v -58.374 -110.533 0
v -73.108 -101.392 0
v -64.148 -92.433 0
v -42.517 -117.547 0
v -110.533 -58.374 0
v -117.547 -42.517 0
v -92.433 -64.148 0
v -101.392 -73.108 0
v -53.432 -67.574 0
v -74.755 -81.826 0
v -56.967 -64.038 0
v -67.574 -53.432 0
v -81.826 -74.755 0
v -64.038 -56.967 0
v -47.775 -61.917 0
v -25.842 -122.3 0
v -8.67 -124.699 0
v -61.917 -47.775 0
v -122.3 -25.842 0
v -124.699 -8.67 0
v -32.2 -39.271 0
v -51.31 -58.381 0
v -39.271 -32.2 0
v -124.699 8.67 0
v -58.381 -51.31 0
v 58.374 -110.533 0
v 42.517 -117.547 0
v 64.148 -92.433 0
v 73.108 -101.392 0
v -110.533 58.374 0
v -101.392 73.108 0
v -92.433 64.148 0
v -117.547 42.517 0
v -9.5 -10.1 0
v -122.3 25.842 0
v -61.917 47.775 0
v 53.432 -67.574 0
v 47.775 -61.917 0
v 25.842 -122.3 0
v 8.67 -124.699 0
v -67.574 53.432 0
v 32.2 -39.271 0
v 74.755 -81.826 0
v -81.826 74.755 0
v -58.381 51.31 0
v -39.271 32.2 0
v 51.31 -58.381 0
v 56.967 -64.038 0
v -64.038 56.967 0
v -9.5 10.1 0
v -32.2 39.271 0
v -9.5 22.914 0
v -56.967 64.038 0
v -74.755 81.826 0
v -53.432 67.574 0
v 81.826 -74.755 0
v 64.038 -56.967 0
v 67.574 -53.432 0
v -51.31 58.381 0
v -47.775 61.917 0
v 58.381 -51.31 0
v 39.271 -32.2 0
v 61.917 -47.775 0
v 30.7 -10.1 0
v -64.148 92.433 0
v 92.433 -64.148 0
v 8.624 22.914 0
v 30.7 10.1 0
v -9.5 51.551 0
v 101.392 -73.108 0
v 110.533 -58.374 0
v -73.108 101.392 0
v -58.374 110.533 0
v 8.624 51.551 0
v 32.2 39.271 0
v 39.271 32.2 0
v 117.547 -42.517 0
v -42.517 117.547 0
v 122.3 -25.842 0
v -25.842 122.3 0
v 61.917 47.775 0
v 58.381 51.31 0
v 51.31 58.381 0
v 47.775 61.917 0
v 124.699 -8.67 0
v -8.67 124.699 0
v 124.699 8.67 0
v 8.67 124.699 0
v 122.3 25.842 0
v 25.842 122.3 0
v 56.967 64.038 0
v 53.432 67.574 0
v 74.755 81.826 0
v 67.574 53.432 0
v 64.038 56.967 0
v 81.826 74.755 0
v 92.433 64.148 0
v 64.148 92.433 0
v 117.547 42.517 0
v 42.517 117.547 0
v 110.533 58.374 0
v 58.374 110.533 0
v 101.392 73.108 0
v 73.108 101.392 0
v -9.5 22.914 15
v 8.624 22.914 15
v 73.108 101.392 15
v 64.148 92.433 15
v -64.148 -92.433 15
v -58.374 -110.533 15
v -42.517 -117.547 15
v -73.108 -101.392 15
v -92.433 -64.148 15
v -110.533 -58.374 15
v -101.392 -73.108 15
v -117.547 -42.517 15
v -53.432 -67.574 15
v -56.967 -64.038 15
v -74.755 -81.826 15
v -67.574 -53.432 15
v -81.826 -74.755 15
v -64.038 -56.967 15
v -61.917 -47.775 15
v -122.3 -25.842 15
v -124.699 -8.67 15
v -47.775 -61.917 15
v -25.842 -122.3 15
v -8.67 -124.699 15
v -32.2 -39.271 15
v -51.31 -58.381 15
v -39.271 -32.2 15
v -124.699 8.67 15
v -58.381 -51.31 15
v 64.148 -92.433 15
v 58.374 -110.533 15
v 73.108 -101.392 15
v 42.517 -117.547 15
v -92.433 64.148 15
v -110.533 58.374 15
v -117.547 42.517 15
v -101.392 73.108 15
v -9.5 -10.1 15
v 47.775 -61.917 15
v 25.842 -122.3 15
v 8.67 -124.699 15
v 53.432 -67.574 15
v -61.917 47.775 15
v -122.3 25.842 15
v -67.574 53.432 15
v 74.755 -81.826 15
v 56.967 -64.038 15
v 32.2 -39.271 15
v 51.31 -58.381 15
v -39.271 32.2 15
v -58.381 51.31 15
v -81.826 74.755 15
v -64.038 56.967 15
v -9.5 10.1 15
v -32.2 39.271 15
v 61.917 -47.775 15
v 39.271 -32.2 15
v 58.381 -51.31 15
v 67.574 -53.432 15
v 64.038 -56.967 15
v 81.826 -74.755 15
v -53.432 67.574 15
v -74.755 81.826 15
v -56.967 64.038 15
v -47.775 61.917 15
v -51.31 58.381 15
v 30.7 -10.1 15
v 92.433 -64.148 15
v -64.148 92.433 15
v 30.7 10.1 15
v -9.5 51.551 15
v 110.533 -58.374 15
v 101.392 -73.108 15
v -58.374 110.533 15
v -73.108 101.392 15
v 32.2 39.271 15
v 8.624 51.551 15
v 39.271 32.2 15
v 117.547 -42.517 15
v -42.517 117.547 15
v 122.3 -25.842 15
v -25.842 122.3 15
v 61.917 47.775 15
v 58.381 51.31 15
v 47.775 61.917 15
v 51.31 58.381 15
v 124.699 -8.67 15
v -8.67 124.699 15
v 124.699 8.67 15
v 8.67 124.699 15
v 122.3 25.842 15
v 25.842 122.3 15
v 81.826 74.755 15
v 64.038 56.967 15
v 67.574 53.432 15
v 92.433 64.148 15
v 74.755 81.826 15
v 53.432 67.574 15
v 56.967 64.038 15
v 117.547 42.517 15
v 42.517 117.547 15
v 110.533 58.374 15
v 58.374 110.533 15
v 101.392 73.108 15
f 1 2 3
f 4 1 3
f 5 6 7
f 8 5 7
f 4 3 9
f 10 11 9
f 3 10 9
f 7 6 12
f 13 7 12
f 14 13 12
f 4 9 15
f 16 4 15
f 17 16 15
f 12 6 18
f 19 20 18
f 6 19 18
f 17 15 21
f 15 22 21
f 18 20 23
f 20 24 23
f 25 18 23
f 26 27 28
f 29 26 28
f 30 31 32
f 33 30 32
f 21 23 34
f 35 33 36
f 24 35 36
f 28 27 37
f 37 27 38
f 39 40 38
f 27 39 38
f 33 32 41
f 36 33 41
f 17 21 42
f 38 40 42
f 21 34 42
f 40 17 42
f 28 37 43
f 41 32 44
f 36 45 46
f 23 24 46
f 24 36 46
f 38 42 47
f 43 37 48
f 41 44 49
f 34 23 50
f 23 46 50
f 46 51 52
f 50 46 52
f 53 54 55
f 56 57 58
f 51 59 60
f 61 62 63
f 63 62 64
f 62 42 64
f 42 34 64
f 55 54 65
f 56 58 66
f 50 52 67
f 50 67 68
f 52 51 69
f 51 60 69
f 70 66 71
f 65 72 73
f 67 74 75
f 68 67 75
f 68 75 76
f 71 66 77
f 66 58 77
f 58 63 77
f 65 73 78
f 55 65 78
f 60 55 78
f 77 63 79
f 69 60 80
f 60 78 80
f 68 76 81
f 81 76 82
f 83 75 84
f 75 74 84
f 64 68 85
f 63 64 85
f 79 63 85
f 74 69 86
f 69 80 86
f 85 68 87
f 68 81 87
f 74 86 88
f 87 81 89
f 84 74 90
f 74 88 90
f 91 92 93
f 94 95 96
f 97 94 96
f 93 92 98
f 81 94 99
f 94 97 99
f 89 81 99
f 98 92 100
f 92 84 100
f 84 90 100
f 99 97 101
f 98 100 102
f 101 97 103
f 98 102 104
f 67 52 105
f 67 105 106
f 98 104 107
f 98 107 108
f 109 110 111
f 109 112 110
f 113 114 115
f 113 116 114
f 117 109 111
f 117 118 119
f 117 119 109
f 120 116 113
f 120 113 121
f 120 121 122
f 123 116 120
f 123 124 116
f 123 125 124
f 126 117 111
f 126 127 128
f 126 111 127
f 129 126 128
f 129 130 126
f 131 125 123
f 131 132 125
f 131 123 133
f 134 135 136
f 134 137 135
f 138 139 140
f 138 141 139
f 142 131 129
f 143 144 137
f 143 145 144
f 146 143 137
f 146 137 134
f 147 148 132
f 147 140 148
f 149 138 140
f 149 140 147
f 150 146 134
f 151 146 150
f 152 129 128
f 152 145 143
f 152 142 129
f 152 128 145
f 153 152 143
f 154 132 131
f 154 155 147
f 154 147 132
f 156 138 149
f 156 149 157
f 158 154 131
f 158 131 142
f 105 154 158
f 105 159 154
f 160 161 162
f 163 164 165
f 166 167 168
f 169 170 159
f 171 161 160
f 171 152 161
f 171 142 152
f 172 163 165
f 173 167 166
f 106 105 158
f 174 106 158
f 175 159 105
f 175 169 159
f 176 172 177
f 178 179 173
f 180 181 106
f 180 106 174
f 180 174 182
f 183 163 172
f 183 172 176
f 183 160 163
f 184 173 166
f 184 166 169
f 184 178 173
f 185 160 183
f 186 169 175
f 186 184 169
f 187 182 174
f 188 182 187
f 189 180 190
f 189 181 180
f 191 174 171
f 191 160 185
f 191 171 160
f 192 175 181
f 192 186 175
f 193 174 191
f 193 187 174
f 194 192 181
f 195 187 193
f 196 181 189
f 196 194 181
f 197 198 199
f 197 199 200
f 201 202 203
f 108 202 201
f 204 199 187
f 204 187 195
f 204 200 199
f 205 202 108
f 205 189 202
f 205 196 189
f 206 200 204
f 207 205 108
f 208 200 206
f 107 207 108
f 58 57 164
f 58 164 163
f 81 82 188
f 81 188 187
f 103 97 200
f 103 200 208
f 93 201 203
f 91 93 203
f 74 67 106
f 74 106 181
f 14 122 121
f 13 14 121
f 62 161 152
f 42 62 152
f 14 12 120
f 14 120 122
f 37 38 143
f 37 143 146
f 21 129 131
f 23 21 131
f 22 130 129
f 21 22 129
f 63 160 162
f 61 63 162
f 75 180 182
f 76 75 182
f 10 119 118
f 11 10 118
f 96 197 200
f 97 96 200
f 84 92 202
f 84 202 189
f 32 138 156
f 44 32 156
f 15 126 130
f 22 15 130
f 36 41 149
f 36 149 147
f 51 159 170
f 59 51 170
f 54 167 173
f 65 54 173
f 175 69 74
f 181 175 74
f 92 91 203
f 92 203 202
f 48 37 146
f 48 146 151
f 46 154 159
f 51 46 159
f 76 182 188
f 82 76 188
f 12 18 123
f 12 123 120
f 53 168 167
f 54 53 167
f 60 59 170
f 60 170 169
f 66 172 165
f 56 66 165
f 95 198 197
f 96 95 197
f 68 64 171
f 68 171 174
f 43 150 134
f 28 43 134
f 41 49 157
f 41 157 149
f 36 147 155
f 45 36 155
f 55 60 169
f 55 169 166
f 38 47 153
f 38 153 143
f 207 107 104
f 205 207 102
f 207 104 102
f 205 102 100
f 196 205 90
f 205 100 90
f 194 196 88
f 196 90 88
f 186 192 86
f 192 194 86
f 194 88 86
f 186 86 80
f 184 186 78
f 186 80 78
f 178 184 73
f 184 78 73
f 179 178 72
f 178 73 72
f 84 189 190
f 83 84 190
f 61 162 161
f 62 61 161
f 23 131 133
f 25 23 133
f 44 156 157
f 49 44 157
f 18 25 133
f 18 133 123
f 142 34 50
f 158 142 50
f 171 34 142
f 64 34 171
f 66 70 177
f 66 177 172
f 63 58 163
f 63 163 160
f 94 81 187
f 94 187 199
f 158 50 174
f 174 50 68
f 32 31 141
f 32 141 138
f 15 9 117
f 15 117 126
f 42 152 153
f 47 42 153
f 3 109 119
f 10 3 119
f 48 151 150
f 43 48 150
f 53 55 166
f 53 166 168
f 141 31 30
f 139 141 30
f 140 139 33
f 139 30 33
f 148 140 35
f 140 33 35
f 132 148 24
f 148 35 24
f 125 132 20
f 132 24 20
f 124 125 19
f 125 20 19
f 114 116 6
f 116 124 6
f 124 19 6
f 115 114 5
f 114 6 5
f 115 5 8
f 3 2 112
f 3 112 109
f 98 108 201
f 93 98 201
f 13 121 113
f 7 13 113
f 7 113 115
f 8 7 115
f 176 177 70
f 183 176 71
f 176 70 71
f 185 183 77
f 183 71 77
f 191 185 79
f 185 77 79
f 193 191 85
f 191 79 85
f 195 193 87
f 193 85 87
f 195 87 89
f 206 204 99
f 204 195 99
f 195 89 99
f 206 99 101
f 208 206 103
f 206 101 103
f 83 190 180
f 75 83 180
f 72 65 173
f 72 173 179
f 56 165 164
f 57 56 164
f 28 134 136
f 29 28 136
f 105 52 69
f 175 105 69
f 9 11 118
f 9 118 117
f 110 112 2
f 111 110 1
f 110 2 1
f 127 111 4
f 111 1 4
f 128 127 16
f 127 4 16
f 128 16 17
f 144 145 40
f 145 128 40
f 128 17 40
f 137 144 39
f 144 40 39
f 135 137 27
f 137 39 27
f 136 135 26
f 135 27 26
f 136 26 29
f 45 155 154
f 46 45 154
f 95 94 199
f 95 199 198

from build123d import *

# Parameters (mm, degrees)
ESQUISSE1_R                  = 125
ESQUISSE1_W                  = 40.2
ESQUISSE1_H                  = 20.2
ESQUISSE1_W_2                = 18.123947537
ESQUISSE1_H_2                = 28.637153683
BOSS_EXTRU_1_DEPTH           = 15
ENL_V_MAT_EXTRU_1_DEPTH      = 15
R_P_TITION_CIRCULAIRE1_COUNT = 4


with BuildPart() as part:
    # Esquisse1 → Boss.-Extru.1 (new body)
    with BuildSketch(Plane.XY):
        Circle(ESQUISSE1_R)
        with Locations((10.6, 0)):
            Rectangle(ESQUISSE1_W, ESQUISSE1_H, mode=Mode.SUBTRACT)
        with Locations((-0.438026231, 37.232201346)):
            Rectangle(ESQUISSE1_W_2, ESQUISSE1_H_2, mode=Mode.SUBTRACT)
    extrude(amount=BOSS_EXTRU_1_DEPTH)

    # Esquisse3 → Enlèv. mat.-Extru.1 (cut)
    with BuildSketch(Plane.XY.offset(15)):
        Polygon((112.62821071, -84.343939462), (92.432755834, -64.148484587), (64.148484587, -92.432755834), (84.343939462, -112.62821071), align=None)
        Polygon((81.950288575, -89.021356387), (89.021356387, -81.950288575), (39.271363502, -32.20029569), (32.20029569, -39.271363502), align=None)
        Polygon((53.431679247, -67.573814871), (67.573814871, -53.431679247), (61.916960621, -47.774824997), (47.774824997, -61.916960621), align=None)
    enl_v_mat_extru_1 = extrude(amount=-ENL_V_MAT_EXTRU_1_DEPTH, mode=Mode.SUBTRACT)

    # Répétition circulaire1: Enlèv. mat.-Extru.1 ×4 about axis
    r_p_tition_circulaire1_axis = Axis((0, 0, 0), (0, 0, 1))
    for i in range(1, R_P_TITION_CIRCULAIRE1_COUNT):
        add(enl_v_mat_extru_1.rotate(r_p_tition_circulaire1_axis, i * 360 / R_P_TITION_CIRCULAIRE1_COUNT), mode=Mode.SUBTRACT)


solid = part.part
